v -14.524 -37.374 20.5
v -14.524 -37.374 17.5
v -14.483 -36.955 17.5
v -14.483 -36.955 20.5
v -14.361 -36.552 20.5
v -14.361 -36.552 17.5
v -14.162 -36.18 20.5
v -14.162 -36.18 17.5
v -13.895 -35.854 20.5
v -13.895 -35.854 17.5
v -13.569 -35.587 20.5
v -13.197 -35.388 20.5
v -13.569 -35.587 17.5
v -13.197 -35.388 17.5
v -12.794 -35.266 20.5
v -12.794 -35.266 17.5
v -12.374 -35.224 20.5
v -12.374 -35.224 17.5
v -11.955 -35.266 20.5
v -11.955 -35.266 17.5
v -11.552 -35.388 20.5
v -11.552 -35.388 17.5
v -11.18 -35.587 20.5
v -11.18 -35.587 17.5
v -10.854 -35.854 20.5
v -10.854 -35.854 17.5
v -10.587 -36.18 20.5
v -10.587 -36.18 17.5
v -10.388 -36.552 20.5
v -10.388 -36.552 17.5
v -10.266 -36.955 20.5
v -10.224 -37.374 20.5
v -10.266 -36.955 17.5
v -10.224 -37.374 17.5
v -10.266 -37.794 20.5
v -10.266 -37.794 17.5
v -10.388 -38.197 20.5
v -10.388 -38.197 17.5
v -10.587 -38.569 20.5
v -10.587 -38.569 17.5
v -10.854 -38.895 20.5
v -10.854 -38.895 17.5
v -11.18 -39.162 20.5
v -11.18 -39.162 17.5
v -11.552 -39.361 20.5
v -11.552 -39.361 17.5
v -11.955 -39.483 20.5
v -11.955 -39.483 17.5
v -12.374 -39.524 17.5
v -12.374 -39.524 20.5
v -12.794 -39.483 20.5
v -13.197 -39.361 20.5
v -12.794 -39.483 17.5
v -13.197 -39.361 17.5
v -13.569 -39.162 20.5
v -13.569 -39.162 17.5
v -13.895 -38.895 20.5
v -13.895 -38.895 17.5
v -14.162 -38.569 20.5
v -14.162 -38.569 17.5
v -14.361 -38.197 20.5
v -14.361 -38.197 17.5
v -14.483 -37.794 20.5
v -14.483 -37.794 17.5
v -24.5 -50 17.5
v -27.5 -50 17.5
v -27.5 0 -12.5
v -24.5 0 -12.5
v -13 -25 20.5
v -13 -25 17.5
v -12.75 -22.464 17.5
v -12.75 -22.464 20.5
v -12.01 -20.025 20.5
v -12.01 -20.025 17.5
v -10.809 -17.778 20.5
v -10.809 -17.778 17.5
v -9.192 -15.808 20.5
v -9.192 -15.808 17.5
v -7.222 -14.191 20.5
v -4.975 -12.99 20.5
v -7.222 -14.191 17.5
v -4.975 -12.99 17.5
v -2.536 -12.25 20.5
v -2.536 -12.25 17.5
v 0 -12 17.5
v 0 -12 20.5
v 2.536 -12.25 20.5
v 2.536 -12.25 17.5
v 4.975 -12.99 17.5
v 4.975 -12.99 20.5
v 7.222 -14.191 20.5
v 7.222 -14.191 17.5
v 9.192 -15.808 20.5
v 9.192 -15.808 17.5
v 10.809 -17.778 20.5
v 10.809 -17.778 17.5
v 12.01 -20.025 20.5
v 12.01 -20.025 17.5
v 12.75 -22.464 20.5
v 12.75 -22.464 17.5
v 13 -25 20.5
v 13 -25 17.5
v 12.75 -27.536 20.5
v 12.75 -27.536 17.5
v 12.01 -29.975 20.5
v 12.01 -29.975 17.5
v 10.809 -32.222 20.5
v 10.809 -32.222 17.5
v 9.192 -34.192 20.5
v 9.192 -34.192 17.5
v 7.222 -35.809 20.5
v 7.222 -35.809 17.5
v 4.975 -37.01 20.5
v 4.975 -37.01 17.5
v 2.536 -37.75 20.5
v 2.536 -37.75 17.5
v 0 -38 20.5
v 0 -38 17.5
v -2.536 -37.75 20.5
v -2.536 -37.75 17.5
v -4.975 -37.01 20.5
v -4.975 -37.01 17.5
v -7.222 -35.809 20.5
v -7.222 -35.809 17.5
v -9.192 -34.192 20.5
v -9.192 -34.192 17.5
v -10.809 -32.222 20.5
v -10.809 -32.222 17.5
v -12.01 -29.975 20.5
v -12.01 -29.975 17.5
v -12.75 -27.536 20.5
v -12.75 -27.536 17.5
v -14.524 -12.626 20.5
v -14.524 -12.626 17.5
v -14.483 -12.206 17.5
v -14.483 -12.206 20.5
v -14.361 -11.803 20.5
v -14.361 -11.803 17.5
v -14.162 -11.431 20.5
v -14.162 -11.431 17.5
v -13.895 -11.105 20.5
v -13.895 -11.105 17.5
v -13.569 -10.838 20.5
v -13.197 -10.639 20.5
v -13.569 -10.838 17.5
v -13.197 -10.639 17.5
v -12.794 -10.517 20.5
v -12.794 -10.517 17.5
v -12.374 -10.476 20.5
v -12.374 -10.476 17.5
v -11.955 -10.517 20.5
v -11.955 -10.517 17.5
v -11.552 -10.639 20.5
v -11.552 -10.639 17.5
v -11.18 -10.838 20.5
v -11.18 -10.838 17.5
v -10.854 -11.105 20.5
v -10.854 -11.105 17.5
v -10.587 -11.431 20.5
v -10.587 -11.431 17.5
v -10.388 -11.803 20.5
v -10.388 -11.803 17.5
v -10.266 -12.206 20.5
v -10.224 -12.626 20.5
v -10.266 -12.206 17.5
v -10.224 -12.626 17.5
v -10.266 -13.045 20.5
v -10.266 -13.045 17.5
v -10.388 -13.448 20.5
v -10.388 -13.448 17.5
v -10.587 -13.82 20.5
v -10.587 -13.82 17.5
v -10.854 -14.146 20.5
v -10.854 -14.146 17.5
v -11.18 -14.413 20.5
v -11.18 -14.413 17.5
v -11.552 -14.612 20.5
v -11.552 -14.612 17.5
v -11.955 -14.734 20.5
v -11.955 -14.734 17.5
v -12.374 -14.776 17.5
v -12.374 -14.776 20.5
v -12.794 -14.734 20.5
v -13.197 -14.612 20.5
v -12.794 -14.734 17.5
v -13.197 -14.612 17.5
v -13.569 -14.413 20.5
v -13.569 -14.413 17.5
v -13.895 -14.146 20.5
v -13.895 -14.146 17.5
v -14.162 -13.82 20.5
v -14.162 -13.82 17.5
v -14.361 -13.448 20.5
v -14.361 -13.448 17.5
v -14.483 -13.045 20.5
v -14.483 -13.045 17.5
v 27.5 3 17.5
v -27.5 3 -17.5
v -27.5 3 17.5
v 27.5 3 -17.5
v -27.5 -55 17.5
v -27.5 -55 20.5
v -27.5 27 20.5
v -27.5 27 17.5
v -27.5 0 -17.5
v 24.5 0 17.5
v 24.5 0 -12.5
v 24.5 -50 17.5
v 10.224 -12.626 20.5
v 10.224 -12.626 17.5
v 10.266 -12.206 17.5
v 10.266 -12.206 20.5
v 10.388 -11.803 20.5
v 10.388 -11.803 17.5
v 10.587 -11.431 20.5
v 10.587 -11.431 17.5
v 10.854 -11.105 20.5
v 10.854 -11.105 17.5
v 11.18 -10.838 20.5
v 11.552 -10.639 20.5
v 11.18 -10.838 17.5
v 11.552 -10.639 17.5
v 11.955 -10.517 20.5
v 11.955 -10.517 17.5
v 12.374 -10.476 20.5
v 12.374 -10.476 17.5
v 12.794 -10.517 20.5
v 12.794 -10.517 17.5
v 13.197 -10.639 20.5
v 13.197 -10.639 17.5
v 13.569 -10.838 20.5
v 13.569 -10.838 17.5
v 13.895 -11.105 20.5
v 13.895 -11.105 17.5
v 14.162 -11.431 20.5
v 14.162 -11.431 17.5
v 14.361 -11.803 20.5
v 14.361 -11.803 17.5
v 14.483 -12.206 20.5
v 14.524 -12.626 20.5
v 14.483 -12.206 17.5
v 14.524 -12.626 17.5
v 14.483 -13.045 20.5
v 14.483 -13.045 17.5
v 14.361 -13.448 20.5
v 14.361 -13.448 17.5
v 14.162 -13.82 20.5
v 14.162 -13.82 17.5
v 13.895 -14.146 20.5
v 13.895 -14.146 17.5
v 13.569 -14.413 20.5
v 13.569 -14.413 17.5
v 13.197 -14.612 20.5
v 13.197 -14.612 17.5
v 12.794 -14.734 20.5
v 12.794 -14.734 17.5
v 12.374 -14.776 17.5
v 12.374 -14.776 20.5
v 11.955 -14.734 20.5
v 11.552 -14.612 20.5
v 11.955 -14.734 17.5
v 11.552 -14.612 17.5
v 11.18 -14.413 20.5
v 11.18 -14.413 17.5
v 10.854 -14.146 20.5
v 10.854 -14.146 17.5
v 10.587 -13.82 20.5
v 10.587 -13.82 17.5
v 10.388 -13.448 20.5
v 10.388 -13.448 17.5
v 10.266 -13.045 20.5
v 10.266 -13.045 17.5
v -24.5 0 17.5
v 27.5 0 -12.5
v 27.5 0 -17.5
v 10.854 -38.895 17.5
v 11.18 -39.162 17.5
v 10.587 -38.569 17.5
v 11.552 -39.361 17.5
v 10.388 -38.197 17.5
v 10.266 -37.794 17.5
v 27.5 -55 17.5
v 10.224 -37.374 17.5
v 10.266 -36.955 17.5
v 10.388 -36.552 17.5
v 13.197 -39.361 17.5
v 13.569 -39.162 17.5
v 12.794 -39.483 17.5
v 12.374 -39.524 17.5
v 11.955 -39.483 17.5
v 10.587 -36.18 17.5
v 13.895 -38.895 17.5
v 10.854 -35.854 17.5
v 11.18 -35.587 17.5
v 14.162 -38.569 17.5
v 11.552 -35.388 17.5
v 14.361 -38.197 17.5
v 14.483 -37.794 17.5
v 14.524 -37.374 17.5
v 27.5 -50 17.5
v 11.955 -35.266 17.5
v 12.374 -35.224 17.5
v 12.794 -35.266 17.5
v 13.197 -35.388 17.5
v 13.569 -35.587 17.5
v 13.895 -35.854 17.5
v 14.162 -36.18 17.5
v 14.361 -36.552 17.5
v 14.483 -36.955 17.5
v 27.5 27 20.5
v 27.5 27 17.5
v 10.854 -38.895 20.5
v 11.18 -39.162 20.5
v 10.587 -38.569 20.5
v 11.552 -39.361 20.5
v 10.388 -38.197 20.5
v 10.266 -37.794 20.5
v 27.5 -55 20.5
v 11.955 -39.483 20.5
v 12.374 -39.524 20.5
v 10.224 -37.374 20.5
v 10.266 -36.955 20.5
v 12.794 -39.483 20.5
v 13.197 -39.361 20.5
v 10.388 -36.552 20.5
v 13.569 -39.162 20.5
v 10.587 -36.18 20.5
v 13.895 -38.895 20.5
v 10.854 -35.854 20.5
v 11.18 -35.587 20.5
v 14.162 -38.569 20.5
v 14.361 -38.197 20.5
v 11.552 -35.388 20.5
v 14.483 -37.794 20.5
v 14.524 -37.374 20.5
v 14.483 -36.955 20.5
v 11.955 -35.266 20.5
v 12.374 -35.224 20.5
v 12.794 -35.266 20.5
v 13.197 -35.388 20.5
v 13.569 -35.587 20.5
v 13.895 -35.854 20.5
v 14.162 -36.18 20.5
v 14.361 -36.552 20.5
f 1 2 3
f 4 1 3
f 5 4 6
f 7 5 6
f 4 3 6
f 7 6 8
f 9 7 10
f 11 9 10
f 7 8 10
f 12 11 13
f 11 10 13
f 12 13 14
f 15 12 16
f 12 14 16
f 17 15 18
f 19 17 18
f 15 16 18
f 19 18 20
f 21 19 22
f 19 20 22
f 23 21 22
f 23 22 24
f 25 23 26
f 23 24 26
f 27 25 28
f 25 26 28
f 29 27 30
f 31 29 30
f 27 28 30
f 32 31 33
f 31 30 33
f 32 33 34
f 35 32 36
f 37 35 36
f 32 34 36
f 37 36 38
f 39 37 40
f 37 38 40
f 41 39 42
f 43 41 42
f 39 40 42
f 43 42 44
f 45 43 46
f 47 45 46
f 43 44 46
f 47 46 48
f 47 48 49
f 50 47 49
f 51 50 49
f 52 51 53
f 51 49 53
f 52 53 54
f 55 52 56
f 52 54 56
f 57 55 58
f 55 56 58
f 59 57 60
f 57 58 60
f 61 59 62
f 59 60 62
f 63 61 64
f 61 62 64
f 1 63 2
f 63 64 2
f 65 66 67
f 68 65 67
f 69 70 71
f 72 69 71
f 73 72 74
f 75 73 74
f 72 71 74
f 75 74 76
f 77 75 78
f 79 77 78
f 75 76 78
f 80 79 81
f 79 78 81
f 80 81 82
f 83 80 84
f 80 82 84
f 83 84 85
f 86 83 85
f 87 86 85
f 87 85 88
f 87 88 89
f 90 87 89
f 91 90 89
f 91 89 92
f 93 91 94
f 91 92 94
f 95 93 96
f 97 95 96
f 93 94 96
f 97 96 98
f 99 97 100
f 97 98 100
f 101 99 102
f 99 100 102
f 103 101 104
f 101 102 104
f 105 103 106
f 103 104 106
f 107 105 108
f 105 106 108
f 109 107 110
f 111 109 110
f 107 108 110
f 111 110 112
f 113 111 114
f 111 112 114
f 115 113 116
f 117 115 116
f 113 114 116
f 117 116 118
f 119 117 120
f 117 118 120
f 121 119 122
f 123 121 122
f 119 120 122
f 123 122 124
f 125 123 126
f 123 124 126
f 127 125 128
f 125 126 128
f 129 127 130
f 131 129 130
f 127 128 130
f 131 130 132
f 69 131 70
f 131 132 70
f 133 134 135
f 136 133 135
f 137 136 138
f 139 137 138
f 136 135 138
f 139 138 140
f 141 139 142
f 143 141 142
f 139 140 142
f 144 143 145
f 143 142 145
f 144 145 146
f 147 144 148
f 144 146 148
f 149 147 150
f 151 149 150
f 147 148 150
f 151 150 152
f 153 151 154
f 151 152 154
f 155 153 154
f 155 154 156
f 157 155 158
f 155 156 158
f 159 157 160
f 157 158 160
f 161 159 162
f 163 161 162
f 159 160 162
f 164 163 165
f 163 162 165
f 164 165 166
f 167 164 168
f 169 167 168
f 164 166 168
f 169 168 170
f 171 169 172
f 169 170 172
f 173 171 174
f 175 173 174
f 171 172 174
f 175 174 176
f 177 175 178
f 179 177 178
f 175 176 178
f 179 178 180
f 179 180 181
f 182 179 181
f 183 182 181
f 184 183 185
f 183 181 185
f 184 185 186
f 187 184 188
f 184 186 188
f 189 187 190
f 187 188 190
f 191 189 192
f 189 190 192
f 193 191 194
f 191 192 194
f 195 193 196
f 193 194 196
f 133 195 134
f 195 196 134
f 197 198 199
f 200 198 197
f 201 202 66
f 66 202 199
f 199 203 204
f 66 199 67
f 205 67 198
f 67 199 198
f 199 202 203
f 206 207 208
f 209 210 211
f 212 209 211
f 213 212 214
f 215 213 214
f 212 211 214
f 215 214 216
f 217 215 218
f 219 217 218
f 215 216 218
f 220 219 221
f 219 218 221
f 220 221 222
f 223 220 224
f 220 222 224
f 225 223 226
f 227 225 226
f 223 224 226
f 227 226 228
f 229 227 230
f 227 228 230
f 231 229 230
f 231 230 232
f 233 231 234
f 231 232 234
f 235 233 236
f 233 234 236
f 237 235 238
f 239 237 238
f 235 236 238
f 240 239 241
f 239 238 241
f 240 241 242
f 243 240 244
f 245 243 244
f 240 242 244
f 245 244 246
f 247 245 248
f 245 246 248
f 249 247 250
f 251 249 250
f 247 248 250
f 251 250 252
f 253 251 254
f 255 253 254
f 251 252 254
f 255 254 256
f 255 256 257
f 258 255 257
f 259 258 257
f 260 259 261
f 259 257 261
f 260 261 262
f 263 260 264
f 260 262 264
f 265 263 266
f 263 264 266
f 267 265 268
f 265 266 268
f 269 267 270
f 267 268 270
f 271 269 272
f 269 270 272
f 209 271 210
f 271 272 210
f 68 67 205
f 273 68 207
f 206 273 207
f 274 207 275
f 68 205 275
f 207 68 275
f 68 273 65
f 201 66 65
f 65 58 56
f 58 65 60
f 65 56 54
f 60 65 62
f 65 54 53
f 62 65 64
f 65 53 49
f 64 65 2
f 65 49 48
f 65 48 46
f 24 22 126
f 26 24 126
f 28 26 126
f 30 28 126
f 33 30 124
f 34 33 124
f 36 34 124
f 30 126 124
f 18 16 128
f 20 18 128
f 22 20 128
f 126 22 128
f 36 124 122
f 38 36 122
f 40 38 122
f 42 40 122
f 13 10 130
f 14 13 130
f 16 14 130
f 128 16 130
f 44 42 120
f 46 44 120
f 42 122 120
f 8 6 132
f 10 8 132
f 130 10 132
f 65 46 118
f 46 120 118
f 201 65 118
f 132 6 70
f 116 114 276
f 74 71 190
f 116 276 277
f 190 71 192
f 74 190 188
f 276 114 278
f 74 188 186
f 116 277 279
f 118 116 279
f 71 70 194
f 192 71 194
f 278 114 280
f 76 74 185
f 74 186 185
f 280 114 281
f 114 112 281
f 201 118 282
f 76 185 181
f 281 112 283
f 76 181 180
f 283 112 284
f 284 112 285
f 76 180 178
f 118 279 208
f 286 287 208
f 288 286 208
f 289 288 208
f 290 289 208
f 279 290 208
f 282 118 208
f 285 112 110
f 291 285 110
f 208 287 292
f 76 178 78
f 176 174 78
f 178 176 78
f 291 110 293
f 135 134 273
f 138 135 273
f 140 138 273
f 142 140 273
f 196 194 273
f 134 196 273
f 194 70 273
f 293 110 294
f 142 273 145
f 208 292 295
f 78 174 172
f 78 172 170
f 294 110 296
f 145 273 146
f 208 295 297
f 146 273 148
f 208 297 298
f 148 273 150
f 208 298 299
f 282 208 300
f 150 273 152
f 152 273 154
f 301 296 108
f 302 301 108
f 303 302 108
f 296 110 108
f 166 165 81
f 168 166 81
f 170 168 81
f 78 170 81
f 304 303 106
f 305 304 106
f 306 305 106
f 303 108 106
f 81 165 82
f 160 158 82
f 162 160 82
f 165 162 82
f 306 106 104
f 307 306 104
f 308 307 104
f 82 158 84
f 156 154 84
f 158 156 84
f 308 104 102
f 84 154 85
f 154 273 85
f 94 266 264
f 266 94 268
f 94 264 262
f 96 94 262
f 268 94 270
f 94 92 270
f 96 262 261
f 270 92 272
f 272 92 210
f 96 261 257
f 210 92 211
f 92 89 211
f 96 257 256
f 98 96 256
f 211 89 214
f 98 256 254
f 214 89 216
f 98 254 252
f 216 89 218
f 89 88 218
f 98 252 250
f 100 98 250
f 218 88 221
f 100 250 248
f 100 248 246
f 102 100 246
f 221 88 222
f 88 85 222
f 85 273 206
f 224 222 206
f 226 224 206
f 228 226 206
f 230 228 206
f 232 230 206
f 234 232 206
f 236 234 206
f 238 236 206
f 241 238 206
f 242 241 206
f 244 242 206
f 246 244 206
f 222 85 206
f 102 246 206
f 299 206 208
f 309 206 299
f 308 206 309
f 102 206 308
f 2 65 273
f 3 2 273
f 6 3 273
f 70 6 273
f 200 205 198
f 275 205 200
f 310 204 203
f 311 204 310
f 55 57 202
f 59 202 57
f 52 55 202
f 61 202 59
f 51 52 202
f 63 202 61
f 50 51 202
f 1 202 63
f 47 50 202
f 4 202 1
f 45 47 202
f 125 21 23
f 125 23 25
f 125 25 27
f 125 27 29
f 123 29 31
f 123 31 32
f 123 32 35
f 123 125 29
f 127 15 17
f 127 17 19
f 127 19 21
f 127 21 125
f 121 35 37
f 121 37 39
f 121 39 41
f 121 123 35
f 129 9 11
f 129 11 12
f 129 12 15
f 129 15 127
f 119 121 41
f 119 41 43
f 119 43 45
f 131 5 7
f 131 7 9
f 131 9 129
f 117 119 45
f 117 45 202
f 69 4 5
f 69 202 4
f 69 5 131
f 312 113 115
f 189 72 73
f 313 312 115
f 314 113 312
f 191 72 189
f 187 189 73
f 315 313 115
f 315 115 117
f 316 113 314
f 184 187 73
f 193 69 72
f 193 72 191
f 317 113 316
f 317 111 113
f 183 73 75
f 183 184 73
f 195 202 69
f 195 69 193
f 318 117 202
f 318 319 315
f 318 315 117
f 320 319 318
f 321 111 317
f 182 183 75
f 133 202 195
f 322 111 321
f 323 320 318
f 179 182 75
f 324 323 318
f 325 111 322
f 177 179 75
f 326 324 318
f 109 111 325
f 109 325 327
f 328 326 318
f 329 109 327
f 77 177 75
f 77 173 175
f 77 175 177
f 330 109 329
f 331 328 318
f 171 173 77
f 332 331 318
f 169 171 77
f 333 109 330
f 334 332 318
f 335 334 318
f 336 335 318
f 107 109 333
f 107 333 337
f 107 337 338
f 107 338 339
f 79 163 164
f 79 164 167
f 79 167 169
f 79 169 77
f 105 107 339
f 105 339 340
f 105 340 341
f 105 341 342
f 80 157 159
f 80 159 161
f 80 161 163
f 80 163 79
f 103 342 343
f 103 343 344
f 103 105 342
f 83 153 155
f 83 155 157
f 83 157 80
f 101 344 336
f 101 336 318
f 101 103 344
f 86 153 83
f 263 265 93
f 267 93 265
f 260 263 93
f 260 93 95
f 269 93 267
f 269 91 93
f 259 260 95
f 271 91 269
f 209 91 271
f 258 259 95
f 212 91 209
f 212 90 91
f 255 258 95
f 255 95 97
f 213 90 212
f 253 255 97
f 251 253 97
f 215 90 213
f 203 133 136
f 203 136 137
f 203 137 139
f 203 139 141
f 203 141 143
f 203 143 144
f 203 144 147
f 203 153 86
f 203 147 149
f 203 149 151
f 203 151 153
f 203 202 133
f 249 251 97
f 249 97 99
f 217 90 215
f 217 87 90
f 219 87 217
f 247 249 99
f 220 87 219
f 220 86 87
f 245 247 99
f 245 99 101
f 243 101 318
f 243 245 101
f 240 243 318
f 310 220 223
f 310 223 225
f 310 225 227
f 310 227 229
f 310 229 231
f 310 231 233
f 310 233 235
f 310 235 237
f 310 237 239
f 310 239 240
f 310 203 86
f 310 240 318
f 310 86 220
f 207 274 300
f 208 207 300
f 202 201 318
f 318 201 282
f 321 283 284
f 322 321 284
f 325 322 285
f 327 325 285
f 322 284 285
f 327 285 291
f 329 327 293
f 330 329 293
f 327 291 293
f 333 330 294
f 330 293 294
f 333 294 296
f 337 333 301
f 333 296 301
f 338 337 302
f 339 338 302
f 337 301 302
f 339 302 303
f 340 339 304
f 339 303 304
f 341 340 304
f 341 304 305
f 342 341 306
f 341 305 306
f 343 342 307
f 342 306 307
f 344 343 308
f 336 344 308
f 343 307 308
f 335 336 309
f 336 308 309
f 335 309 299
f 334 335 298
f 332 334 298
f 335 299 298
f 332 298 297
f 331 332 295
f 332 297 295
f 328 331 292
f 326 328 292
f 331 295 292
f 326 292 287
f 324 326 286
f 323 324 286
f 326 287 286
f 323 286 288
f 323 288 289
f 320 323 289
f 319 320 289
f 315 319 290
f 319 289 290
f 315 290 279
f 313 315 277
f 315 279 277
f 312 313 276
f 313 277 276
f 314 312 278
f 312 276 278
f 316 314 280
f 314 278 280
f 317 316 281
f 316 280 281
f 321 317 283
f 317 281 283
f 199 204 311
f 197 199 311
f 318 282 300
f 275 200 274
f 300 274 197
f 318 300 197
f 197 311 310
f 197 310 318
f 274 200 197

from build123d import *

# Parameters (mm, degrees)
SKETCH1_W           = 55
SKETCH1_H           = 35
BOSS_EXTRUDE1_DEPTH = 3
SKETCH2_W           = 55
SKETCH2_H           = 82
BOSS_EXTRUDE2_DEPTH = 3
BOSS_EXTRUDE3_DEPTH = 3
BOSS_EXTRUDE4_DEPTH = 3
SKETCH5_R           = 13
SKETCH5_R_2         = 2.15
CUT_EXTRUDE1_DEPTH  = 3


with BuildPart() as part:
    # Sketch1 → Boss-Extrude1 (new body)
    with BuildSketch(Plane(origin=(0, 0, 0), x_dir=(1, 0, 0), z_dir=(0, 1, 0))):
        Rectangle(SKETCH1_W, SKETCH1_H)
    extrude(amount=BOSS_EXTRUDE1_DEPTH)

    # Sketch2 → Boss-Extrude2 (add)
    with BuildSketch(Plane.XY.offset(17.5)):
        with Locations((0, -14)):
            Rectangle(SKETCH2_W, SKETCH2_H)
    extrude(amount=BOSS_EXTRUDE2_DEPTH)

    # Sketch3 → Boss-Extrude3 (add)
    with BuildSketch(Plane(origin=(27.5, 0, 0), x_dir=(0, 0, -1), z_dir=(1, 0, 0))):
        Polygon((-17.5, 0), (12.5, 0), (-17.5, -50), align=None)
    extrude(amount=-BOSS_EXTRUDE3_DEPTH)

    # Sketch4 → Boss-Extrude4 (add)
    with BuildSketch(Plane.ZY.offset(27.5)):
        Polygon((-12.5, 0), (17.5, 0), (17.5, -50), align=None)
    extrude(amount=-BOSS_EXTRUDE4_DEPTH)

    # Sketch5 → Cut-Extrude1 (cut)
    with BuildSketch(Plane(origin=(0, 0, 17.5), x_dir=(-1, 0, 0), z_dir=(0, 0, -1))):
        with Locations((0, -25)):
            Circle(SKETCH5_R)
        with Locations((12.374368671, -12.625631329)):
            Circle(SKETCH5_R_2)
        with Locations((12.374368671, -37.374368671)):
            Circle(SKETCH5_R_2)
        with Locations((-12.374368671, -37.374368671)):
            Circle(SKETCH5_R_2)
        with Locations((-12.374368671, -12.625631329)):
            Circle(SKETCH5_R_2)
    extrude(amount=-CUT_EXTRUDE1_DEPTH, mode=Mode.SUBTRACT)


solid = part.part
